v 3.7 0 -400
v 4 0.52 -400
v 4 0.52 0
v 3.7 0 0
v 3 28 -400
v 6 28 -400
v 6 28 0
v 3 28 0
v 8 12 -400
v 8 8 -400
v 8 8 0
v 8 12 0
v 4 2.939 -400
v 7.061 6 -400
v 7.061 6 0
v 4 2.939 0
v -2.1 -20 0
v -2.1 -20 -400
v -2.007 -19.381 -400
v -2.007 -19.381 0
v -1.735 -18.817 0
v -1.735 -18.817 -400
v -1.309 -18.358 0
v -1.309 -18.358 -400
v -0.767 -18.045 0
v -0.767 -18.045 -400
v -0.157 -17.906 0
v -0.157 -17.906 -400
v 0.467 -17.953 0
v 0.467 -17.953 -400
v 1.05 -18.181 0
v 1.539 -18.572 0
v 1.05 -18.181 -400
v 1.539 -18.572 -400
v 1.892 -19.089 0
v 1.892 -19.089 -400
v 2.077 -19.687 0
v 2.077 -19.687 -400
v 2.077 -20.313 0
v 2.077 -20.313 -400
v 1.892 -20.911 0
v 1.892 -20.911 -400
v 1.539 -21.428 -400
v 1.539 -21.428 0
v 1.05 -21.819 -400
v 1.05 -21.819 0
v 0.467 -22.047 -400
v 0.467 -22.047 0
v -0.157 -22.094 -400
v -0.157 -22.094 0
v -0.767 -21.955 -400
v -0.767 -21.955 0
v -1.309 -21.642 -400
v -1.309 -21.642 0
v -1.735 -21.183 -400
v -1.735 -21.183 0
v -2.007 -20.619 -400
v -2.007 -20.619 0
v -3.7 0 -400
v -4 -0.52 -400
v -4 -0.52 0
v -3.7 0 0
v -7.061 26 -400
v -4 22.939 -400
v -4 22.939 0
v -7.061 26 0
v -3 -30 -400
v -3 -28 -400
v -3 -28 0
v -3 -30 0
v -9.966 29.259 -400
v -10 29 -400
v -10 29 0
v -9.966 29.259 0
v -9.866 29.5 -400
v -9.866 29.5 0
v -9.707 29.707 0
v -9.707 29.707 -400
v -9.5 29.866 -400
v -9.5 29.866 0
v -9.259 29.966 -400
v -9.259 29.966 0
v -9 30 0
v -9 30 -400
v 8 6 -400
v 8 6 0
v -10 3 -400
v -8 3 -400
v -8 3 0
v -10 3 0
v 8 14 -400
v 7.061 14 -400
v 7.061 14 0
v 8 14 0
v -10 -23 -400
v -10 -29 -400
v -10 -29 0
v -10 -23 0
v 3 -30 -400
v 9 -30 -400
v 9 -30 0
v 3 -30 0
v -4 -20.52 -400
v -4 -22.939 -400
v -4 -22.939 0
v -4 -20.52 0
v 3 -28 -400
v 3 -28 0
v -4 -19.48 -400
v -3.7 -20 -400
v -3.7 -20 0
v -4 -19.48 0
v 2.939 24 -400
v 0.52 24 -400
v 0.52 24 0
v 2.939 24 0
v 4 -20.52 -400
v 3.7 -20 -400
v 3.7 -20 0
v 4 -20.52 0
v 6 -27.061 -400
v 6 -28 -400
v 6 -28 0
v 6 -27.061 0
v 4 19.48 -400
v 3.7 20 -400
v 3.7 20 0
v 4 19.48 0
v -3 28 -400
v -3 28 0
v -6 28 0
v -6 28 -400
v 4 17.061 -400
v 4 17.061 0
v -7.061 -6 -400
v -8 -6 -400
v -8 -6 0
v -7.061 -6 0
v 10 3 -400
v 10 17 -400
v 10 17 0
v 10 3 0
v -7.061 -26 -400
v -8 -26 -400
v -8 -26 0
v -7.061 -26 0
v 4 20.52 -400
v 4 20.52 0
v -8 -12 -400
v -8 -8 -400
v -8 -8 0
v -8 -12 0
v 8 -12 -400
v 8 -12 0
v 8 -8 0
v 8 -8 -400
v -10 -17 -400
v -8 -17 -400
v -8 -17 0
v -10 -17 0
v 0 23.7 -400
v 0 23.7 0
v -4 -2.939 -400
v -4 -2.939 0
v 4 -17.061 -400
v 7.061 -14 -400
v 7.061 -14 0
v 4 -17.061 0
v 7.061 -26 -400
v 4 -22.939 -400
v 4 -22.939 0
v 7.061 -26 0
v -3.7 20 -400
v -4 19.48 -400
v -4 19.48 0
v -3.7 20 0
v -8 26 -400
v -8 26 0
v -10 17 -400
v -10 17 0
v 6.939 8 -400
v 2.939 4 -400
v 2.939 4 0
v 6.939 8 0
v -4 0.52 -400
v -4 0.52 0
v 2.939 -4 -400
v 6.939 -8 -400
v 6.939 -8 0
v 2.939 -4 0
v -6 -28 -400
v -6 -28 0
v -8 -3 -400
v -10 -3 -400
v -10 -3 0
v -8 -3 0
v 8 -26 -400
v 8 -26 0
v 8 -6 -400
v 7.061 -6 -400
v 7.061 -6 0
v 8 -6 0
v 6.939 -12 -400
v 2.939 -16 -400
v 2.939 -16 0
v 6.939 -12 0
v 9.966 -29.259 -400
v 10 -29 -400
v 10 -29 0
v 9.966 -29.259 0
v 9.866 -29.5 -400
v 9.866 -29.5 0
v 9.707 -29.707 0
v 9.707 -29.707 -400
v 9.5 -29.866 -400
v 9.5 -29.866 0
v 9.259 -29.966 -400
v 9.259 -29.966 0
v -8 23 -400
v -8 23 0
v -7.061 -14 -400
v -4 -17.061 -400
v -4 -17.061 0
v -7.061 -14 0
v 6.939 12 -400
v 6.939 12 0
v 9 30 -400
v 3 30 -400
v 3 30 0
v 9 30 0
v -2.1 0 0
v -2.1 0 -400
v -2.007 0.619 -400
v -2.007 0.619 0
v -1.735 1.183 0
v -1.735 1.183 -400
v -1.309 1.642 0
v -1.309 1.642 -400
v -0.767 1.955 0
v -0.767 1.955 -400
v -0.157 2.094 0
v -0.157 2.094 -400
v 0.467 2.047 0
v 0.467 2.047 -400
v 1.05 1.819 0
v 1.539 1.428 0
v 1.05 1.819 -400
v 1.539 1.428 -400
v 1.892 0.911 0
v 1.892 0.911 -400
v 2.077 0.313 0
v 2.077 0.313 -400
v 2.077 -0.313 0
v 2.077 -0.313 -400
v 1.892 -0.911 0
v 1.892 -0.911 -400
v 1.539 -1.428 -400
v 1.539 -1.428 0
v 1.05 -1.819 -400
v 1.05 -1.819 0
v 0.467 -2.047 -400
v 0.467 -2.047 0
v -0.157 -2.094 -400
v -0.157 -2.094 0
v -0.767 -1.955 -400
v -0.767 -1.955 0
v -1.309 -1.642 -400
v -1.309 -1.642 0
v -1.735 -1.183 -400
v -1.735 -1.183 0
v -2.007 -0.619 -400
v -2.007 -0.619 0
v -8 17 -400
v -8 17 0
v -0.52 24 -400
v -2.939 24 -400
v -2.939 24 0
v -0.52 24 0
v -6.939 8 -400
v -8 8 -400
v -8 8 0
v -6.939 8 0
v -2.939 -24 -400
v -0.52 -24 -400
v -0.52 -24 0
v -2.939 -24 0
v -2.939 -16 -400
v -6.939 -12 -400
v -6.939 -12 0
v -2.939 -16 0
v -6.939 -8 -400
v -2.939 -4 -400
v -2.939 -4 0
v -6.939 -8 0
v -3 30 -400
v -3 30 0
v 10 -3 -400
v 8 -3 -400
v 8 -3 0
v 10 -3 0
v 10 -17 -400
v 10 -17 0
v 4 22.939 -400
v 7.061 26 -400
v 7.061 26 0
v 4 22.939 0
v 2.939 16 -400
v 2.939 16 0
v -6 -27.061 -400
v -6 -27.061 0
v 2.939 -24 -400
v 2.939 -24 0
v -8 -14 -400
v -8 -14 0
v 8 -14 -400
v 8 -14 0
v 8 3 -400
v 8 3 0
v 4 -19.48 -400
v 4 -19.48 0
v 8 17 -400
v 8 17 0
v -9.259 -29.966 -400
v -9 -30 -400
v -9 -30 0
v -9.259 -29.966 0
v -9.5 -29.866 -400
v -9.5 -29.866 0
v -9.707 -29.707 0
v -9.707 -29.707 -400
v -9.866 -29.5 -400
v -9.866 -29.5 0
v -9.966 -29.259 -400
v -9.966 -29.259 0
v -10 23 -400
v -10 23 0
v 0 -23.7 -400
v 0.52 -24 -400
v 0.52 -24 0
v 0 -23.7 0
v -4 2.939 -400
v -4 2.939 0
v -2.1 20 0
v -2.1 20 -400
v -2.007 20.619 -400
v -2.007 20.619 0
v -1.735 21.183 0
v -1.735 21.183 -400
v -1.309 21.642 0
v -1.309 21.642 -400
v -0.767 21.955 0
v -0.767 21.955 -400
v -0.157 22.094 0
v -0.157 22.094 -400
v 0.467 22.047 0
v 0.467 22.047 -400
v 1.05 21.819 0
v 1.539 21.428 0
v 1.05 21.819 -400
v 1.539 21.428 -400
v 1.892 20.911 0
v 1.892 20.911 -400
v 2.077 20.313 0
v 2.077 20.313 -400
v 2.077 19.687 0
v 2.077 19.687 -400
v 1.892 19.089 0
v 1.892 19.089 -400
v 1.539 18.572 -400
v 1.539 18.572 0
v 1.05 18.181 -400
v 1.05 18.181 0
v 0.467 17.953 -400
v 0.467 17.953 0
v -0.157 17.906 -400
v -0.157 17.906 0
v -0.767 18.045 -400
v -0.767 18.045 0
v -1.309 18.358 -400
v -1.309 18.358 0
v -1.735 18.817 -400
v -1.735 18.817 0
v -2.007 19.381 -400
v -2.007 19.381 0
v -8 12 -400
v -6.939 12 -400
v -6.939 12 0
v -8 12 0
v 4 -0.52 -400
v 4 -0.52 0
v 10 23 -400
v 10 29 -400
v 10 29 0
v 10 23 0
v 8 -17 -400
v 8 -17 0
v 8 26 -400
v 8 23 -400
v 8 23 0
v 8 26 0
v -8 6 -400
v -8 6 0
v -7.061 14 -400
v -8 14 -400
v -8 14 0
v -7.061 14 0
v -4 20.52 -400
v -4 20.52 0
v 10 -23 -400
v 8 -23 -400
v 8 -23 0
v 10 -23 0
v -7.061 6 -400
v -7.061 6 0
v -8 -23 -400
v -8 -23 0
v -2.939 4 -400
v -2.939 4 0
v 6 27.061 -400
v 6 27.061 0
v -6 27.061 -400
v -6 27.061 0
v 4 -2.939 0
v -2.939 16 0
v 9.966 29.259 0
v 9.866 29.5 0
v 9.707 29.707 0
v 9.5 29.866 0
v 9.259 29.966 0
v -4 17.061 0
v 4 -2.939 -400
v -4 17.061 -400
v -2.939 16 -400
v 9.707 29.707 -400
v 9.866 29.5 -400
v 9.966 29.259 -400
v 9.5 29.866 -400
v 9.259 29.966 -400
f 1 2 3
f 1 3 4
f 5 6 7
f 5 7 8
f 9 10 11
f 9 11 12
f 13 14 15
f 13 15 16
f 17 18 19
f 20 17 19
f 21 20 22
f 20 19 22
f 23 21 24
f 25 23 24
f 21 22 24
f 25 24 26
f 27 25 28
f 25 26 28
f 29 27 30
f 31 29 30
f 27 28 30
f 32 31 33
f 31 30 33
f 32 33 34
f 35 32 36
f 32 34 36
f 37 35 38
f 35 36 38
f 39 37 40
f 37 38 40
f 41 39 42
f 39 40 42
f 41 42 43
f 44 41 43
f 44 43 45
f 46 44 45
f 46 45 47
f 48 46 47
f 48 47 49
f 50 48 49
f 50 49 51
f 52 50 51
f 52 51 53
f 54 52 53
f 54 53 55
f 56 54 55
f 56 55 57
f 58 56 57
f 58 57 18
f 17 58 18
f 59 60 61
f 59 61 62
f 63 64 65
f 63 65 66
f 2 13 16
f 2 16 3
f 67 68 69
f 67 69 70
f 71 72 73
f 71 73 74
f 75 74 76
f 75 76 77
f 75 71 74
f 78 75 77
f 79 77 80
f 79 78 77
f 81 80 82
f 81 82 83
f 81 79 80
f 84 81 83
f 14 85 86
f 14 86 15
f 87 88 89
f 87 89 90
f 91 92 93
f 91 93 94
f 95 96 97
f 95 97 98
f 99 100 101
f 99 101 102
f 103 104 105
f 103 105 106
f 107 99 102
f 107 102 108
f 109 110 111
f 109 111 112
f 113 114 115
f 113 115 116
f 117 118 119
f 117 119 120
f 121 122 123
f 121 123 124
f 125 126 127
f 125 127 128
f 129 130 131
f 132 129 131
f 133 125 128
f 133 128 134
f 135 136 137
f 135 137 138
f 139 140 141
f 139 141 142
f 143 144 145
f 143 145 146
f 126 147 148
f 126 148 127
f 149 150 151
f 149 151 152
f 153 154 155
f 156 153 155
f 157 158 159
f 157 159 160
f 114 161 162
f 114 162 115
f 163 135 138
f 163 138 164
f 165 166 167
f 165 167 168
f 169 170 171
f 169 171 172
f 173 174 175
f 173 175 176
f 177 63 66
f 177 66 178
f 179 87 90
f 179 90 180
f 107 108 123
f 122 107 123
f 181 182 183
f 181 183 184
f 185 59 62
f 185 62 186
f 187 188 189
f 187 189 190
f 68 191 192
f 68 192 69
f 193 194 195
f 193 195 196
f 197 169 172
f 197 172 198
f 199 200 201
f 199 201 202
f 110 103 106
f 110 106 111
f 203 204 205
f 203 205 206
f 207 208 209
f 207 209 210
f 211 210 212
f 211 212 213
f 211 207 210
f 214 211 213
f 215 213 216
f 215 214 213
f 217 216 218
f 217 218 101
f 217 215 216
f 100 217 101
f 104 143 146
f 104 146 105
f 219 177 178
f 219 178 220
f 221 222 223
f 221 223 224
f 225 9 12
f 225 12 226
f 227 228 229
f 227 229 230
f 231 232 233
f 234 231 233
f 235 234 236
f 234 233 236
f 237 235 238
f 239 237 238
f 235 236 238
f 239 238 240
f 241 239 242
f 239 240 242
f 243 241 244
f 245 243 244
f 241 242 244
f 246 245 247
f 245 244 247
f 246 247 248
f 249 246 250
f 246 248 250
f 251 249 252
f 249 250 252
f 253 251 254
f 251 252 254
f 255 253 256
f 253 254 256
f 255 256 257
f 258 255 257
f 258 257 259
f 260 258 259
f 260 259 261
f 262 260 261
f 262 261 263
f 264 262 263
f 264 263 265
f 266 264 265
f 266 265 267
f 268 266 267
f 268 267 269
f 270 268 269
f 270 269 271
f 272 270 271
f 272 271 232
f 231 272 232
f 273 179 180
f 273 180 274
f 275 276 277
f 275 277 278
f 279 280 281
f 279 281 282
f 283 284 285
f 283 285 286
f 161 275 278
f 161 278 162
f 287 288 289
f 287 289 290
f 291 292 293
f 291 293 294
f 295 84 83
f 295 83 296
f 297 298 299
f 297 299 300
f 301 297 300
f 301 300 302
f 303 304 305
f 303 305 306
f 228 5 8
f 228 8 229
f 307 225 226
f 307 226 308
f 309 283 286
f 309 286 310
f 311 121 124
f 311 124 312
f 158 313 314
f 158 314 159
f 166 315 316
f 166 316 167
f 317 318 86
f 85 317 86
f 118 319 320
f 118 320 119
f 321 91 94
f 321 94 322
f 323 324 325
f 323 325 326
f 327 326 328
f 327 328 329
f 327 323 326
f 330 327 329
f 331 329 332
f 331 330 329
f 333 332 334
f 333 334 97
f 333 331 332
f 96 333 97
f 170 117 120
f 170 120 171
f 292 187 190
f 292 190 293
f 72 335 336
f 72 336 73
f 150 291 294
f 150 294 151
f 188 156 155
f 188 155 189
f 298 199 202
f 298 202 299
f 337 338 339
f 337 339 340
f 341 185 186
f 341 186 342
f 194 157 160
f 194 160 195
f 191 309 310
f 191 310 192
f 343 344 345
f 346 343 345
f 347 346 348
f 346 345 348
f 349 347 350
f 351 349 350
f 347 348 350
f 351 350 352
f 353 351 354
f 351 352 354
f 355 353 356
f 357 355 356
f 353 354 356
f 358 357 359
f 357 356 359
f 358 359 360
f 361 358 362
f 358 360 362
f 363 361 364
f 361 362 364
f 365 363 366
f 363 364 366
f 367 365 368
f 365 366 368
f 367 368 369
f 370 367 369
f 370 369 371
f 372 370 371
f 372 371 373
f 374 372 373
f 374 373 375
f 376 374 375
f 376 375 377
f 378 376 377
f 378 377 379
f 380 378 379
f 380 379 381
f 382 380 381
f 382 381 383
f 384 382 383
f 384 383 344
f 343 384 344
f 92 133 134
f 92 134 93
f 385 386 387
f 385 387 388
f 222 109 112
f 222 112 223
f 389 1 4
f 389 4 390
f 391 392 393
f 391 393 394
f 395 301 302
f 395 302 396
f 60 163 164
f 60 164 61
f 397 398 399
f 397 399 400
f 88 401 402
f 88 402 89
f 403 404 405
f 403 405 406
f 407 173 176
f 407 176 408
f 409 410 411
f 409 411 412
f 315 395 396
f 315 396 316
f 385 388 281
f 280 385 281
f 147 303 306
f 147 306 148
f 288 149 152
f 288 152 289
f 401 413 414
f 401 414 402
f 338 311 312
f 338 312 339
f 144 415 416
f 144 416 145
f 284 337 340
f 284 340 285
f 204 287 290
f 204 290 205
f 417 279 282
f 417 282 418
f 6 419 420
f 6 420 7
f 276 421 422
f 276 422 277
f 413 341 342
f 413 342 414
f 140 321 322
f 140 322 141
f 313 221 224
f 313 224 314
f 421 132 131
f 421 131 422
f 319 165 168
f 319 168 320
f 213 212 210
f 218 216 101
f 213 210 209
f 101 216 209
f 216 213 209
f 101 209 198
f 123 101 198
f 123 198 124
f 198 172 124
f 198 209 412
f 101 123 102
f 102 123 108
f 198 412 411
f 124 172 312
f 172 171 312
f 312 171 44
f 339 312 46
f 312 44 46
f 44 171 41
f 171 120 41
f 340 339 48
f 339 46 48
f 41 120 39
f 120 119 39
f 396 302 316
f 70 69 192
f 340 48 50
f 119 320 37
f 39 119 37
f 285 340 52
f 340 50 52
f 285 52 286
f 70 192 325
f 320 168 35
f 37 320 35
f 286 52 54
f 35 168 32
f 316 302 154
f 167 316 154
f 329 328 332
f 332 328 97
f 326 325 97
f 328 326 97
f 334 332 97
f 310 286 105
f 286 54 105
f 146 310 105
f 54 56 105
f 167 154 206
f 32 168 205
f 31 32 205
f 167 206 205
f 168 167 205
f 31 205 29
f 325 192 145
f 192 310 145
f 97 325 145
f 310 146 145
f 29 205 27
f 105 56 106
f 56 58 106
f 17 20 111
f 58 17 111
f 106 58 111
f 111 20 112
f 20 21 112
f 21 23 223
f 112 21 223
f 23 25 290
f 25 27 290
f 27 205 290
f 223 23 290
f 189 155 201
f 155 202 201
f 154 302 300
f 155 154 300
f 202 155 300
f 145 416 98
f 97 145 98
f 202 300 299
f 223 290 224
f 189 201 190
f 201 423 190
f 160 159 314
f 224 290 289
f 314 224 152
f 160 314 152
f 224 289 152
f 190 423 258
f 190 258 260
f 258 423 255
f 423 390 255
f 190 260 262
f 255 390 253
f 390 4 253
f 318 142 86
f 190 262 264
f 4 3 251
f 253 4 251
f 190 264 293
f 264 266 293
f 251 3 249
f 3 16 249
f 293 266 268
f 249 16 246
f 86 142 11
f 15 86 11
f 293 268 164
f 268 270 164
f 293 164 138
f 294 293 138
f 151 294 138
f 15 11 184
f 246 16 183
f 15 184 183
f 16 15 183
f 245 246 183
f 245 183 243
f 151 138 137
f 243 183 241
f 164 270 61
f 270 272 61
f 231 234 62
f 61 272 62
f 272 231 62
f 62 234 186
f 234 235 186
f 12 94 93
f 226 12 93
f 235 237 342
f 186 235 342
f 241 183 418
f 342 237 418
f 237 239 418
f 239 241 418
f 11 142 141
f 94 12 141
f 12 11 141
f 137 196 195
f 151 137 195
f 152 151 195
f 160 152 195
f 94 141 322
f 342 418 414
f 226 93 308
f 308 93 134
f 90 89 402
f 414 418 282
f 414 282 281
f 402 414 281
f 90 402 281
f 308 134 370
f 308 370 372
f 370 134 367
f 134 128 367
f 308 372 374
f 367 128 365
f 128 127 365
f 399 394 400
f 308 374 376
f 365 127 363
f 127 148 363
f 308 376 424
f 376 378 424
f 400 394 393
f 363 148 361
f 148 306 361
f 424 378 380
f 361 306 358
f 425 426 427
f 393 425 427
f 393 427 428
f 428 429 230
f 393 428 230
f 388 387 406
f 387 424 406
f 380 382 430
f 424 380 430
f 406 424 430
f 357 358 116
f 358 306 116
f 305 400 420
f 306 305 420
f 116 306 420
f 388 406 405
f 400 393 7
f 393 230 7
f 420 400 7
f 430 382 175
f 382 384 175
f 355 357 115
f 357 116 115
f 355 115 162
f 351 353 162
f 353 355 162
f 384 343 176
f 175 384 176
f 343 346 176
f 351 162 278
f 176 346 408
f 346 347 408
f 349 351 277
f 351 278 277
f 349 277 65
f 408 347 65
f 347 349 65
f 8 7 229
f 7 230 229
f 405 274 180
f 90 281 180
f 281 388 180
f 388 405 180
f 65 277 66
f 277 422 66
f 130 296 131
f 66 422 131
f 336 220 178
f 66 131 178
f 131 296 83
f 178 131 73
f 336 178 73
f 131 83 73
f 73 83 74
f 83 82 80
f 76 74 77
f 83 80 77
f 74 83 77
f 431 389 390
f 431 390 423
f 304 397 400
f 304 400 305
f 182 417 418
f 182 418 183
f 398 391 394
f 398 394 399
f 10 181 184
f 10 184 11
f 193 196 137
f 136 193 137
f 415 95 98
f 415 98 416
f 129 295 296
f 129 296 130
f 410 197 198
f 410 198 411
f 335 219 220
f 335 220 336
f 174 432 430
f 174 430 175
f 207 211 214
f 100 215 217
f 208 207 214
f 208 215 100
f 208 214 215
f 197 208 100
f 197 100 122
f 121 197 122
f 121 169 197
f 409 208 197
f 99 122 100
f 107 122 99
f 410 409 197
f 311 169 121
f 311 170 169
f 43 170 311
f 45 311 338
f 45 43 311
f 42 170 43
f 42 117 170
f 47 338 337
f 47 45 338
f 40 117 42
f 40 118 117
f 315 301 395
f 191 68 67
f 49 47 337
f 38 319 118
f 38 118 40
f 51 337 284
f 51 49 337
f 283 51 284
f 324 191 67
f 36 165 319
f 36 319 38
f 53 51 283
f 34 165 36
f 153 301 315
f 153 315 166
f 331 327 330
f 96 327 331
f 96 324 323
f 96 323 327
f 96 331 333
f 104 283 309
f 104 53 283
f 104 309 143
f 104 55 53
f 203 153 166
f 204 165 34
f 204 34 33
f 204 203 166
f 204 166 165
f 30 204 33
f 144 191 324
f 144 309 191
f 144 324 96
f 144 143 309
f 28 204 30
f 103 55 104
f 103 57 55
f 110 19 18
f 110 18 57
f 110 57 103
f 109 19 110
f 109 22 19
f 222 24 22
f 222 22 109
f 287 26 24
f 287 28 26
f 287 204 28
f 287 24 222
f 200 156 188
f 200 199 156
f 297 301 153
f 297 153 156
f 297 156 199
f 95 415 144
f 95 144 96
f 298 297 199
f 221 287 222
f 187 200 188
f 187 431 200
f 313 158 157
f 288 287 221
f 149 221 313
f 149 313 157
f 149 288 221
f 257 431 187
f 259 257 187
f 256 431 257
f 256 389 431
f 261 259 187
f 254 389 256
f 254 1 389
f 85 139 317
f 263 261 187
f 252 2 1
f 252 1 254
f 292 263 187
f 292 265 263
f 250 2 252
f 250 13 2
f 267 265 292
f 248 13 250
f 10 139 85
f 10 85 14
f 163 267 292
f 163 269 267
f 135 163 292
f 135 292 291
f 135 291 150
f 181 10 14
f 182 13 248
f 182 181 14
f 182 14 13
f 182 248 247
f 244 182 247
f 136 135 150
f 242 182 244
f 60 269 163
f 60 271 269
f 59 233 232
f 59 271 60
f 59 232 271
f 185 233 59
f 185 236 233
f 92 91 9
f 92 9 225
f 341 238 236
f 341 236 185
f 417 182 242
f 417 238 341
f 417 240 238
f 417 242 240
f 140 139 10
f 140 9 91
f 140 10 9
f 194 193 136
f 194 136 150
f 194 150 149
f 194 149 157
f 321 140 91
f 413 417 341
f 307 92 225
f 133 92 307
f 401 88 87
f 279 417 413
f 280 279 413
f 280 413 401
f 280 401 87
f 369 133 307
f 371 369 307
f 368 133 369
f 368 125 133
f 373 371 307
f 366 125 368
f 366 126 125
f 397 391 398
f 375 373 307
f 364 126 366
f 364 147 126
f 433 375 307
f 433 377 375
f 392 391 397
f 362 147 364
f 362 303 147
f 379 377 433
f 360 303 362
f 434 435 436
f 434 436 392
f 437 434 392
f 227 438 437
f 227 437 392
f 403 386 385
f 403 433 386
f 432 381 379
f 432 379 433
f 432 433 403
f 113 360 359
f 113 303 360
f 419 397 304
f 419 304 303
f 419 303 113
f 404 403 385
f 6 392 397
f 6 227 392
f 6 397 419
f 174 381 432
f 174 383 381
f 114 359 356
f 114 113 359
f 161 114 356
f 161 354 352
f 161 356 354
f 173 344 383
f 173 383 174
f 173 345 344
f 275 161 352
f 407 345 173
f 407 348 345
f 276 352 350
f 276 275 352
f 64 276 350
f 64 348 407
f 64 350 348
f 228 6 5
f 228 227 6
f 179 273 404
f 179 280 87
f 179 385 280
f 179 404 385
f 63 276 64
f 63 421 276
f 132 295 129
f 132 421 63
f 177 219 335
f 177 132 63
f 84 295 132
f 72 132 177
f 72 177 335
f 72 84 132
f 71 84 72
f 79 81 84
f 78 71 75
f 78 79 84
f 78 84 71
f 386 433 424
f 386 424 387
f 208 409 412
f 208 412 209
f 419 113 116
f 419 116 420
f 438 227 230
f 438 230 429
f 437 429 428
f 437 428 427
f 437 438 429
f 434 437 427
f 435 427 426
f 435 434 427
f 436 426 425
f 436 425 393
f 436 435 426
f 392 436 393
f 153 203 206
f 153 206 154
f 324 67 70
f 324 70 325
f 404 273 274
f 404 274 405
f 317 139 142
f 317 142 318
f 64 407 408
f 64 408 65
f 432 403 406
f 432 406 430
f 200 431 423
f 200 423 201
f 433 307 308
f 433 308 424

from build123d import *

# Parameters (mm, degrees)
SKETCH1_R                 = 2.1
BOSS_EXTRUDE1_DEPTH       = 400
M5X0_8_TAPPED_HOLE1_D     = 4.2
M5X0_8_TAPPED_HOLE1_DEPTH = 14
M5X0_8_TAPPED_HOLE1_TIP   = 1.2618073
M5X0_8_TAPPED_HOLE2_D     = 4.2
M5X0_8_TAPPED_HOLE2_DEPTH = 14
M5X0_8_TAPPED_HOLE2_TIP   = 1.2618073


with BuildPart() as part:
    # Sketch1 → Boss-Extrude1 (new body)
    with BuildSketch(Plane(origin=(0, 0, -400), x_dir=(-1, 0, 0), z_dir=(0, 0, -1))):
        with BuildLine():
            Line((10, -17), (10, -3))
            Line((10, -3), (8, -3))
            Line((8, -3), (8, -6))
            Line((8, -6), (7.060660172, -6))
            Line((7.060660172, -6), (4, -2.939339828))
            Line((4, -2.939339828), (4, -0.519615242))
            Line((4, -0.519615242), (3.7, 0))
            Line((3.7, 0), (4, 0.519615242))
            Line((4, 0.519615242), (4, 2.939339828))
            Line((4, 2.939339828), (7.060660172, 6))
            Line((7.060660172, 6), (8, 6))
            Line((8, 6), (8, 3))
            Line((8, 3), (10, 3))
            Line((10, 3), (10, 17))
            Line((10, 17), (8, 17))
            Line((8, 17), (8, 14))
            Line((8, 14), (7.060660172, 14))
            Line((7.060660172, 14), (4, 17.060660172))
            Line((4, 17.060660172), (4, 19.480384758))
            Line((4, 19.480384758), (3.7, 20))
            Line((3.7, 20), (4, 20.519615242))
            Line((4, 20.519615242), (4, 22.939339828))
            Line((4, 22.939339828), (7.060660172, 26))
            Line((7.060660172, 26), (8, 26))
            Line((8, 26), (8, 23))
            Line((8, 23), (10, 23))
            Line((10, 23), (10, 29))
            ThreePointArc((10, 29), (9.707106781, 29.707106781), (9, 30))
            Line((9, 30), (3, 30))
            Line((3, 30), (3, 28))
            Line((3, 28), (6, 28))
            Line((6, 28), (6, 27.060660172))
            Line((6, 27.060660172), (2.939339828, 24))
            Line((2.939339828, 24), (0.519615242, 24))
            Line((0.519615242, 24), (0, 23.7))
            Line((0, 23.7), (-0.519615242, 24))
            Line((-0.519615242, 24), (-2.939339828, 24))
            Line((-2.939339828, 24), (-6, 27.060660172))
            Line((-6, 27.060660172), (-6, 28))
            Line((-6, 28), (-3, 28))
            Line((-3, 28), (-3, 30))
            Line((-3, 30), (-9, 30))
            ThreePointArc((-9, 30), (-9.707106781, 29.707106781), (-10, 29))
            Line((-10, 29), (-10, 23))
            Line((-10, 23), (-8, 23))
            Line((-8, 23), (-8, 26))
            Line((-8, 26), (-7.060660172, 26))
            Line((-7.060660172, 26), (-4, 22.939339828))
            Line((-4, 22.939339828), (-4, 20.519615242))
            Line((-4, 20.519615242), (-3.7, 20))
            Line((-3.7, 20), (-4, 19.480384758))
            Line((-4, 19.480384758), (-4, 17.060660172))
            Line((-4, 17.060660172), (-7.060660172, 14))
            Line((-7.060660172, 14), (-8, 14))
            Line((-8, 14), (-8, 17))
            Line((-8, 17), (-10, 17))
            Line((-10, 17), (-10, 3))
            Line((-10, 3), (-8, 3))
            Line((-8, 3), (-8, 6))
            Line((-8, 6), (-7.060660172, 6))
            Line((-7.060660172, 6), (-4, 2.939339828))
            Line((-4, 2.939339828), (-4, 0.519615242))
            Line((-4, 0.519615242), (-3.7, 0))
            Line((-3.7, 0), (-4, -0.519615242))
            Line((-4, -0.519615242), (-4, -2.939339828))
            Line((-4, -2.939339828), (-7.060660172, -6))
            Line((-7.060660172, -6), (-8, -6))
            Line((-8, -6), (-8, -3))
            Line((-8, -3), (-10, -3))
            Line((-10, -3), (-10, -17))
            Line((-10, -17), (-8, -17))
            Line((-8, -17), (-8, -14))
            Line((-8, -14), (-7.060660172, -14))
            Line((-7.060660172, -14), (-4, -17.060660172))
            Line((-4, -17.060660172), (-4, -19.480384758))
            Line((-4, -19.480384758), (-3.7, -20))
            Line((-3.7, -20), (-4, -20.519615242))
            Line((-4, -20.519615242), (-4, -22.939339828))
            Line((-4, -22.939339828), (-7.060660172, -26))
            Line((-7.060660172, -26), (-8, -26))
            Line((-8, -26), (-8, -23))
            Line((-8, -23), (-10, -23))
            Line((-10, -23), (-10, -29))
            ThreePointArc((-10, -29), (-9.707106781, -29.707106781), (-9, -30))
            Line((-9, -30), (-3, -30))
            Line((-3, -30), (-3, -28))
            Line((-3, -28), (-6, -28))
            Line((-6, -28), (-6, -27.060660172))
            Line((-6, -27.060660172), (-2.939339828, -24))
            Line((-2.939339828, -24), (-0.519615242, -24))
            Line((-0.519615242, -24), (0, -23.7))
            Line((0, -23.7), (0.519615242, -24))
            Line((0.519615242, -24), (2.939339828, -24))
            Line((2.939339828, -24), (6, -27.060660172))
            Line((6, -27.060660172), (6, -28))
            Line((6, -28), (3, -28))
            Line((3, -28), (3, -30))
            Line((3, -30), (9, -30))
            ThreePointArc((9, -30), (9.707106781, -29.707106781), (10, -29))
            Line((10, -29), (10, -23))
            Line((10, -23), (8, -23))
            Line((8, -23), (8, -26))
            Line((8, -26), (7.060660172, -26))
            Line((7.060660172, -26), (4, -22.939339828))
            Line((4, -22.939339828), (4, -20.519615242))
            Line((4, -20.519615242), (3.7, -20))
            Line((3.7, -20), (4, -19.480384758))
            Line((4, -19.480384758), (4, -17.060660172))
            Line((4, -17.060660172), (7.060660172, -14))
            Line((7.060660172, -14), (8, -14))
            Line((8, -14), (8, -17))
            Line((8, -17), (10, -17))
        make_face()
        Circle(SKETCH1_R, mode=Mode.SUBTRACT)
        with Locations((0, -20)):
            Circle(SKETCH1_R, mode=Mode.SUBTRACT)
        with Locations((0, 20)):
            Circle(SKETCH1_R, mode=Mode.SUBTRACT)
        Polygon((6.939339828, -8), (8, -8), (8, -12), (6.939339828, -12), (2.939339828, -16), (-2.939339828, -16), (-6.939339828, -12), (-8, -12), (-8, -8), (-6.939339828, -8), (-2.939339828, -4), (2.939339828, -4), align=None, mode=Mode.SUBTRACT)
        Polygon((8, 12), (8, 8), (6.939339828, 8), (2.939339828, 4), (-2.939339828, 4), (-6.939339828, 8), (-8, 8), (-8, 12), (-6.939339828, 12), (-2.939339828, 16), (2.939339828, 16), (6.939339828, 12), align=None, mode=Mode.SUBTRACT)
    extrude(amount=-BOSS_EXTRUDE1_DEPTH)

    # M5x0.8 Tapped Hole1
    with Locations(Plane.XY):
        with Locations((0, 20), (0, 0), (0, -20)):
            Hole(M5X0_8_TAPPED_HOLE1_D / 2, depth=M5X0_8_TAPPED_HOLE1_DEPTH)
            with Locations((0, 0, -(M5X0_8_TAPPED_HOLE1_DEPTH + M5X0_8_TAPPED_HOLE1_TIP / 2))):  # 118° drill point
                Cone(0, M5X0_8_TAPPED_HOLE1_D / 2, M5X0_8_TAPPED_HOLE1_TIP, mode=Mode.SUBTRACT)

    # M5x0.8 Tapped Hole2
    with Locations(Plane(origin=(0, 0, -400), x_dir=(-1, 0, 0), z_dir=(0, 0, -1))):
        with Locations((0, -20), (0, 0), (0, 20)):
            Hole(M5X0_8_TAPPED_HOLE2_D / 2, depth=M5X0_8_TAPPED_HOLE2_DEPTH)
            with Locations((0, 0, -(M5X0_8_TAPPED_HOLE2_DEPTH + M5X0_8_TAPPED_HOLE2_TIP / 2))):  # 118° drill point
                Cone(0, M5X0_8_TAPPED_HOLE2_D / 2, M5X0_8_TAPPED_HOLE2_TIP, mode=Mode.SUBTRACT)


solid = part.part
